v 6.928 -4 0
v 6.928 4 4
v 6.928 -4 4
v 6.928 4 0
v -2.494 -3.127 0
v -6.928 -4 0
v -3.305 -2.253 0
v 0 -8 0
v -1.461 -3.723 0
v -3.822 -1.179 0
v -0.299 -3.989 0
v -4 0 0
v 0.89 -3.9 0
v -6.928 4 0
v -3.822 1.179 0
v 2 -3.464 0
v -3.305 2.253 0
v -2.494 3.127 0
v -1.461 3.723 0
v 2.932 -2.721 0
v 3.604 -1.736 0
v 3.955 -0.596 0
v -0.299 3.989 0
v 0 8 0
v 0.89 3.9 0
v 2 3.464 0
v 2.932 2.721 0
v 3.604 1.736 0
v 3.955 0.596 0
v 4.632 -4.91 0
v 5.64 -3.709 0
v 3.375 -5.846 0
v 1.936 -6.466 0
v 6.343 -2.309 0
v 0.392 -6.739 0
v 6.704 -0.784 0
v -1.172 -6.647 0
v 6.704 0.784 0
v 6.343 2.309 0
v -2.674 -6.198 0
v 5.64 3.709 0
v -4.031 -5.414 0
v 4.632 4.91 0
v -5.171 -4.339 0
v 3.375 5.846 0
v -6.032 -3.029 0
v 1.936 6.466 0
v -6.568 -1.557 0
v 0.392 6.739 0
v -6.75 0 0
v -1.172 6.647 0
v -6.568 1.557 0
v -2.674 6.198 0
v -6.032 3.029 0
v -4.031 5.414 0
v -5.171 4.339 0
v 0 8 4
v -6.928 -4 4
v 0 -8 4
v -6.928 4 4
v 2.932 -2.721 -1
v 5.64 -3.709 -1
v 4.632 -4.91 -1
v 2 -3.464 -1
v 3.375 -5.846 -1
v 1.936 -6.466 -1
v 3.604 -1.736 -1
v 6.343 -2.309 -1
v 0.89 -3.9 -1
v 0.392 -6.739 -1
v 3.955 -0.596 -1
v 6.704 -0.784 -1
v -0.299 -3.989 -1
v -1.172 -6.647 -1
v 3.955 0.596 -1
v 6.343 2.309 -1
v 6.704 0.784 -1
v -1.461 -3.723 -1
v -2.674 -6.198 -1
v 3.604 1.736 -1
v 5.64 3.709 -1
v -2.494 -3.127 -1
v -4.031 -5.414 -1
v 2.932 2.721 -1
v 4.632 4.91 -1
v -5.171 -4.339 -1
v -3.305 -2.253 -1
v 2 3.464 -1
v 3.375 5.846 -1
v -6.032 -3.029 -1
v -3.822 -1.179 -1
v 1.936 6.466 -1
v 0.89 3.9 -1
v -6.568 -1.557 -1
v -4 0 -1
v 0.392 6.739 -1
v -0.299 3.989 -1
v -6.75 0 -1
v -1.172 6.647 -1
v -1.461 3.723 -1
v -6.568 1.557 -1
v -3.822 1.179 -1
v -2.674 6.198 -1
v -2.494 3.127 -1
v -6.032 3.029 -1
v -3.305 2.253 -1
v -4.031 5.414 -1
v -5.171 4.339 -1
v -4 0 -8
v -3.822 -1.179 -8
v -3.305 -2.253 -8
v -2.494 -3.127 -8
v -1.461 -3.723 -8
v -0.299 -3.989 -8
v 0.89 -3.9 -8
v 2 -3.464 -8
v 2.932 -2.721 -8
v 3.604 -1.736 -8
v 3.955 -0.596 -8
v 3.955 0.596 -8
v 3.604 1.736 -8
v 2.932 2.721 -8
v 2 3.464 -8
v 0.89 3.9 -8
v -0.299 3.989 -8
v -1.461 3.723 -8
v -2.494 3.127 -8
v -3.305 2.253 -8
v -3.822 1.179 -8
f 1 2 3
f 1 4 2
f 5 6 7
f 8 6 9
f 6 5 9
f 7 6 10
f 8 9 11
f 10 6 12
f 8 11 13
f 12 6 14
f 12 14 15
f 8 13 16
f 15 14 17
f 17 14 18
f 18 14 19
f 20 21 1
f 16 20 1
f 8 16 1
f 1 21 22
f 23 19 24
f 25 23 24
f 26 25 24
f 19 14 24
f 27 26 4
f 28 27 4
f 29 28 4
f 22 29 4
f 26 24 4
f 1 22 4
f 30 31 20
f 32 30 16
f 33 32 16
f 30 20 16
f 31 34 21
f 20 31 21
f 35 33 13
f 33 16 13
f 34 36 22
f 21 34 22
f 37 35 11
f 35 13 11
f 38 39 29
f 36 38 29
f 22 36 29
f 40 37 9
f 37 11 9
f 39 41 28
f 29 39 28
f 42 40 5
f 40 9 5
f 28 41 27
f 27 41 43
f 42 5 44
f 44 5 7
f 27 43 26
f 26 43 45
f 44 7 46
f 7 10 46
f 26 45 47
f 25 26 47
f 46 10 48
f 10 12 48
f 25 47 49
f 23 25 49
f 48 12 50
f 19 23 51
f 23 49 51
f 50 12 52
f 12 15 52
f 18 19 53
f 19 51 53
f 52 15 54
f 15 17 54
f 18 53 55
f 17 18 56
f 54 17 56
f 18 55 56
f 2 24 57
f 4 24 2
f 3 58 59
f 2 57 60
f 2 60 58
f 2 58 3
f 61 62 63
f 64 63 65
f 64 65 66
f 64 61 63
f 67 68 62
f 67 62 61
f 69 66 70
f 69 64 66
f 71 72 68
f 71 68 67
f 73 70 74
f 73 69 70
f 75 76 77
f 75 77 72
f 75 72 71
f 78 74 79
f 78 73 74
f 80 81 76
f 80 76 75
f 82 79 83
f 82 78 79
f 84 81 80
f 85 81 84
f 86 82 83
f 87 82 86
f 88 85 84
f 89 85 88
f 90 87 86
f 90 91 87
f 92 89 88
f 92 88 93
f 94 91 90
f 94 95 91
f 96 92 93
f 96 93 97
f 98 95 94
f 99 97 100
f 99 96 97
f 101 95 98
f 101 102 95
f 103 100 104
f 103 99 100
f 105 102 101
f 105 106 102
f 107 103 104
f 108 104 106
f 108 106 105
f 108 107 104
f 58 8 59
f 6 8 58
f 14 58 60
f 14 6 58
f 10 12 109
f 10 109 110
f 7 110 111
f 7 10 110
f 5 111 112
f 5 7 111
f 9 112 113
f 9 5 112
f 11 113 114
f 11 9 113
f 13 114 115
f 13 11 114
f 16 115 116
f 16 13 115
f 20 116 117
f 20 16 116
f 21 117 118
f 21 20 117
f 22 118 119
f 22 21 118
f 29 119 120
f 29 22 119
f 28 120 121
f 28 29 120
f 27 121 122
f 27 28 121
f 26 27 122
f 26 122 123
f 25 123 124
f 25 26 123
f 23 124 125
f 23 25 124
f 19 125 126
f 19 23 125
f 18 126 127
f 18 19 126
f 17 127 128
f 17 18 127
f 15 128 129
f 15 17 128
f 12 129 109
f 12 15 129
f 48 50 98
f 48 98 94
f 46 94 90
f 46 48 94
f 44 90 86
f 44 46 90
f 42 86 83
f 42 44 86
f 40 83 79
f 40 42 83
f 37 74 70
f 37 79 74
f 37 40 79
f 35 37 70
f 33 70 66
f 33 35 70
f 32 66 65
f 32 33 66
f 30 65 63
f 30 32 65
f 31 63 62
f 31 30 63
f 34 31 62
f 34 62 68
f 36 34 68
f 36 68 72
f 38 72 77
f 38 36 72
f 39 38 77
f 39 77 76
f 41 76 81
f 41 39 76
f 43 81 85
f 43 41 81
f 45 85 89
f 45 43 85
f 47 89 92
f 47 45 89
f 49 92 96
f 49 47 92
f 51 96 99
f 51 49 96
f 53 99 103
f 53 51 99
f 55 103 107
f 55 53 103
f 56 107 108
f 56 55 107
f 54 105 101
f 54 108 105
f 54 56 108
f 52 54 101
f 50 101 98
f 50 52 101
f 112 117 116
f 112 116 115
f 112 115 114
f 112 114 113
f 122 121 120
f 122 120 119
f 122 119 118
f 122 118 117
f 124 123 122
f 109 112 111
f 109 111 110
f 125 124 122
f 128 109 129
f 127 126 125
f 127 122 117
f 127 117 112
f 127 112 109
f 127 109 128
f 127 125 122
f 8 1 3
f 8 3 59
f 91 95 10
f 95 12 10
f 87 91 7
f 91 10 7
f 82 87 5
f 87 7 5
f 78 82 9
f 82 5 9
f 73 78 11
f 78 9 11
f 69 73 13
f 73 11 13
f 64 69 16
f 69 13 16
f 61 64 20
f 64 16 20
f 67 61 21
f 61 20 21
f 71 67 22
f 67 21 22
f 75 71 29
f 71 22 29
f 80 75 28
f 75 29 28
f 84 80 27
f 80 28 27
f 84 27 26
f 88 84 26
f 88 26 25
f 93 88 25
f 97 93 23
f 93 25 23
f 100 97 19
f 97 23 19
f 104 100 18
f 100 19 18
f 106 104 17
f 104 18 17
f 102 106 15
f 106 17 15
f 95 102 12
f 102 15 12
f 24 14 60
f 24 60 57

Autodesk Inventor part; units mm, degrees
ref_plane "YZ Plane" through (0, 0, 0) normal (1, 0, 0) x (0, 1, 0)
ref_plane "XZ Plane" through (0, 0, 0) normal (0, 1, 0) x (-1, 0, 0)
ref_plane "XY Plane" through (0, 0, 0) normal (0, 0, 1) x (1, 0, 0)
sketch "Sketch1" plane through (0, 0, 0) normal (0, 0, 1) x (1, 0, 0)
  line L0 (0, 8) -> (6.9282, 4)
  line L1 (6.9282, 4) -> (6.9282, -4)
  line L2 (6.9282, -4) -> (0, -8)
  line L3 (0, -8) -> (-6.9282, -4)
  line L4 (-6.9282, -4) -> (-6.9282, 4)
  line L5 (-6.9282, 4) -> (0, 8)
  point P0 (0, 0)
  point P1 (0, 0)
  point P2 (-6.9282, 0)
  dimension "d0" = 16
extrude "Extrusion1" add sketch "Sketch1" along normal blind 4
sketch "Sketch2" plane through (0, 0, 0) normal (0, 0, -1) x (-1, 0, 0)
  circle A0 centre (0, 0) radius 4
  dimension "d3" = 8
extrude "Extrusion2" add sketch "Sketch2" along normal blind 8
sketch "Sketch3" plane through (0, 0, 0) normal (0, 0, -1) x (-1, 0, 0)
  circle A0 centre (0, 0) radius 6.75
  circle A1 centre (0, 0) radius 4
  dimension "d6" = 13.5
  dimension "d7" = 8
extrude "Extrusion3" add sketch "Sketch3" along normal blind 1 separate body
thread "Thread1" size "M8x1.25" class "6g" standard "ISO Metric profile" length 7
properties part number "123 cap"
